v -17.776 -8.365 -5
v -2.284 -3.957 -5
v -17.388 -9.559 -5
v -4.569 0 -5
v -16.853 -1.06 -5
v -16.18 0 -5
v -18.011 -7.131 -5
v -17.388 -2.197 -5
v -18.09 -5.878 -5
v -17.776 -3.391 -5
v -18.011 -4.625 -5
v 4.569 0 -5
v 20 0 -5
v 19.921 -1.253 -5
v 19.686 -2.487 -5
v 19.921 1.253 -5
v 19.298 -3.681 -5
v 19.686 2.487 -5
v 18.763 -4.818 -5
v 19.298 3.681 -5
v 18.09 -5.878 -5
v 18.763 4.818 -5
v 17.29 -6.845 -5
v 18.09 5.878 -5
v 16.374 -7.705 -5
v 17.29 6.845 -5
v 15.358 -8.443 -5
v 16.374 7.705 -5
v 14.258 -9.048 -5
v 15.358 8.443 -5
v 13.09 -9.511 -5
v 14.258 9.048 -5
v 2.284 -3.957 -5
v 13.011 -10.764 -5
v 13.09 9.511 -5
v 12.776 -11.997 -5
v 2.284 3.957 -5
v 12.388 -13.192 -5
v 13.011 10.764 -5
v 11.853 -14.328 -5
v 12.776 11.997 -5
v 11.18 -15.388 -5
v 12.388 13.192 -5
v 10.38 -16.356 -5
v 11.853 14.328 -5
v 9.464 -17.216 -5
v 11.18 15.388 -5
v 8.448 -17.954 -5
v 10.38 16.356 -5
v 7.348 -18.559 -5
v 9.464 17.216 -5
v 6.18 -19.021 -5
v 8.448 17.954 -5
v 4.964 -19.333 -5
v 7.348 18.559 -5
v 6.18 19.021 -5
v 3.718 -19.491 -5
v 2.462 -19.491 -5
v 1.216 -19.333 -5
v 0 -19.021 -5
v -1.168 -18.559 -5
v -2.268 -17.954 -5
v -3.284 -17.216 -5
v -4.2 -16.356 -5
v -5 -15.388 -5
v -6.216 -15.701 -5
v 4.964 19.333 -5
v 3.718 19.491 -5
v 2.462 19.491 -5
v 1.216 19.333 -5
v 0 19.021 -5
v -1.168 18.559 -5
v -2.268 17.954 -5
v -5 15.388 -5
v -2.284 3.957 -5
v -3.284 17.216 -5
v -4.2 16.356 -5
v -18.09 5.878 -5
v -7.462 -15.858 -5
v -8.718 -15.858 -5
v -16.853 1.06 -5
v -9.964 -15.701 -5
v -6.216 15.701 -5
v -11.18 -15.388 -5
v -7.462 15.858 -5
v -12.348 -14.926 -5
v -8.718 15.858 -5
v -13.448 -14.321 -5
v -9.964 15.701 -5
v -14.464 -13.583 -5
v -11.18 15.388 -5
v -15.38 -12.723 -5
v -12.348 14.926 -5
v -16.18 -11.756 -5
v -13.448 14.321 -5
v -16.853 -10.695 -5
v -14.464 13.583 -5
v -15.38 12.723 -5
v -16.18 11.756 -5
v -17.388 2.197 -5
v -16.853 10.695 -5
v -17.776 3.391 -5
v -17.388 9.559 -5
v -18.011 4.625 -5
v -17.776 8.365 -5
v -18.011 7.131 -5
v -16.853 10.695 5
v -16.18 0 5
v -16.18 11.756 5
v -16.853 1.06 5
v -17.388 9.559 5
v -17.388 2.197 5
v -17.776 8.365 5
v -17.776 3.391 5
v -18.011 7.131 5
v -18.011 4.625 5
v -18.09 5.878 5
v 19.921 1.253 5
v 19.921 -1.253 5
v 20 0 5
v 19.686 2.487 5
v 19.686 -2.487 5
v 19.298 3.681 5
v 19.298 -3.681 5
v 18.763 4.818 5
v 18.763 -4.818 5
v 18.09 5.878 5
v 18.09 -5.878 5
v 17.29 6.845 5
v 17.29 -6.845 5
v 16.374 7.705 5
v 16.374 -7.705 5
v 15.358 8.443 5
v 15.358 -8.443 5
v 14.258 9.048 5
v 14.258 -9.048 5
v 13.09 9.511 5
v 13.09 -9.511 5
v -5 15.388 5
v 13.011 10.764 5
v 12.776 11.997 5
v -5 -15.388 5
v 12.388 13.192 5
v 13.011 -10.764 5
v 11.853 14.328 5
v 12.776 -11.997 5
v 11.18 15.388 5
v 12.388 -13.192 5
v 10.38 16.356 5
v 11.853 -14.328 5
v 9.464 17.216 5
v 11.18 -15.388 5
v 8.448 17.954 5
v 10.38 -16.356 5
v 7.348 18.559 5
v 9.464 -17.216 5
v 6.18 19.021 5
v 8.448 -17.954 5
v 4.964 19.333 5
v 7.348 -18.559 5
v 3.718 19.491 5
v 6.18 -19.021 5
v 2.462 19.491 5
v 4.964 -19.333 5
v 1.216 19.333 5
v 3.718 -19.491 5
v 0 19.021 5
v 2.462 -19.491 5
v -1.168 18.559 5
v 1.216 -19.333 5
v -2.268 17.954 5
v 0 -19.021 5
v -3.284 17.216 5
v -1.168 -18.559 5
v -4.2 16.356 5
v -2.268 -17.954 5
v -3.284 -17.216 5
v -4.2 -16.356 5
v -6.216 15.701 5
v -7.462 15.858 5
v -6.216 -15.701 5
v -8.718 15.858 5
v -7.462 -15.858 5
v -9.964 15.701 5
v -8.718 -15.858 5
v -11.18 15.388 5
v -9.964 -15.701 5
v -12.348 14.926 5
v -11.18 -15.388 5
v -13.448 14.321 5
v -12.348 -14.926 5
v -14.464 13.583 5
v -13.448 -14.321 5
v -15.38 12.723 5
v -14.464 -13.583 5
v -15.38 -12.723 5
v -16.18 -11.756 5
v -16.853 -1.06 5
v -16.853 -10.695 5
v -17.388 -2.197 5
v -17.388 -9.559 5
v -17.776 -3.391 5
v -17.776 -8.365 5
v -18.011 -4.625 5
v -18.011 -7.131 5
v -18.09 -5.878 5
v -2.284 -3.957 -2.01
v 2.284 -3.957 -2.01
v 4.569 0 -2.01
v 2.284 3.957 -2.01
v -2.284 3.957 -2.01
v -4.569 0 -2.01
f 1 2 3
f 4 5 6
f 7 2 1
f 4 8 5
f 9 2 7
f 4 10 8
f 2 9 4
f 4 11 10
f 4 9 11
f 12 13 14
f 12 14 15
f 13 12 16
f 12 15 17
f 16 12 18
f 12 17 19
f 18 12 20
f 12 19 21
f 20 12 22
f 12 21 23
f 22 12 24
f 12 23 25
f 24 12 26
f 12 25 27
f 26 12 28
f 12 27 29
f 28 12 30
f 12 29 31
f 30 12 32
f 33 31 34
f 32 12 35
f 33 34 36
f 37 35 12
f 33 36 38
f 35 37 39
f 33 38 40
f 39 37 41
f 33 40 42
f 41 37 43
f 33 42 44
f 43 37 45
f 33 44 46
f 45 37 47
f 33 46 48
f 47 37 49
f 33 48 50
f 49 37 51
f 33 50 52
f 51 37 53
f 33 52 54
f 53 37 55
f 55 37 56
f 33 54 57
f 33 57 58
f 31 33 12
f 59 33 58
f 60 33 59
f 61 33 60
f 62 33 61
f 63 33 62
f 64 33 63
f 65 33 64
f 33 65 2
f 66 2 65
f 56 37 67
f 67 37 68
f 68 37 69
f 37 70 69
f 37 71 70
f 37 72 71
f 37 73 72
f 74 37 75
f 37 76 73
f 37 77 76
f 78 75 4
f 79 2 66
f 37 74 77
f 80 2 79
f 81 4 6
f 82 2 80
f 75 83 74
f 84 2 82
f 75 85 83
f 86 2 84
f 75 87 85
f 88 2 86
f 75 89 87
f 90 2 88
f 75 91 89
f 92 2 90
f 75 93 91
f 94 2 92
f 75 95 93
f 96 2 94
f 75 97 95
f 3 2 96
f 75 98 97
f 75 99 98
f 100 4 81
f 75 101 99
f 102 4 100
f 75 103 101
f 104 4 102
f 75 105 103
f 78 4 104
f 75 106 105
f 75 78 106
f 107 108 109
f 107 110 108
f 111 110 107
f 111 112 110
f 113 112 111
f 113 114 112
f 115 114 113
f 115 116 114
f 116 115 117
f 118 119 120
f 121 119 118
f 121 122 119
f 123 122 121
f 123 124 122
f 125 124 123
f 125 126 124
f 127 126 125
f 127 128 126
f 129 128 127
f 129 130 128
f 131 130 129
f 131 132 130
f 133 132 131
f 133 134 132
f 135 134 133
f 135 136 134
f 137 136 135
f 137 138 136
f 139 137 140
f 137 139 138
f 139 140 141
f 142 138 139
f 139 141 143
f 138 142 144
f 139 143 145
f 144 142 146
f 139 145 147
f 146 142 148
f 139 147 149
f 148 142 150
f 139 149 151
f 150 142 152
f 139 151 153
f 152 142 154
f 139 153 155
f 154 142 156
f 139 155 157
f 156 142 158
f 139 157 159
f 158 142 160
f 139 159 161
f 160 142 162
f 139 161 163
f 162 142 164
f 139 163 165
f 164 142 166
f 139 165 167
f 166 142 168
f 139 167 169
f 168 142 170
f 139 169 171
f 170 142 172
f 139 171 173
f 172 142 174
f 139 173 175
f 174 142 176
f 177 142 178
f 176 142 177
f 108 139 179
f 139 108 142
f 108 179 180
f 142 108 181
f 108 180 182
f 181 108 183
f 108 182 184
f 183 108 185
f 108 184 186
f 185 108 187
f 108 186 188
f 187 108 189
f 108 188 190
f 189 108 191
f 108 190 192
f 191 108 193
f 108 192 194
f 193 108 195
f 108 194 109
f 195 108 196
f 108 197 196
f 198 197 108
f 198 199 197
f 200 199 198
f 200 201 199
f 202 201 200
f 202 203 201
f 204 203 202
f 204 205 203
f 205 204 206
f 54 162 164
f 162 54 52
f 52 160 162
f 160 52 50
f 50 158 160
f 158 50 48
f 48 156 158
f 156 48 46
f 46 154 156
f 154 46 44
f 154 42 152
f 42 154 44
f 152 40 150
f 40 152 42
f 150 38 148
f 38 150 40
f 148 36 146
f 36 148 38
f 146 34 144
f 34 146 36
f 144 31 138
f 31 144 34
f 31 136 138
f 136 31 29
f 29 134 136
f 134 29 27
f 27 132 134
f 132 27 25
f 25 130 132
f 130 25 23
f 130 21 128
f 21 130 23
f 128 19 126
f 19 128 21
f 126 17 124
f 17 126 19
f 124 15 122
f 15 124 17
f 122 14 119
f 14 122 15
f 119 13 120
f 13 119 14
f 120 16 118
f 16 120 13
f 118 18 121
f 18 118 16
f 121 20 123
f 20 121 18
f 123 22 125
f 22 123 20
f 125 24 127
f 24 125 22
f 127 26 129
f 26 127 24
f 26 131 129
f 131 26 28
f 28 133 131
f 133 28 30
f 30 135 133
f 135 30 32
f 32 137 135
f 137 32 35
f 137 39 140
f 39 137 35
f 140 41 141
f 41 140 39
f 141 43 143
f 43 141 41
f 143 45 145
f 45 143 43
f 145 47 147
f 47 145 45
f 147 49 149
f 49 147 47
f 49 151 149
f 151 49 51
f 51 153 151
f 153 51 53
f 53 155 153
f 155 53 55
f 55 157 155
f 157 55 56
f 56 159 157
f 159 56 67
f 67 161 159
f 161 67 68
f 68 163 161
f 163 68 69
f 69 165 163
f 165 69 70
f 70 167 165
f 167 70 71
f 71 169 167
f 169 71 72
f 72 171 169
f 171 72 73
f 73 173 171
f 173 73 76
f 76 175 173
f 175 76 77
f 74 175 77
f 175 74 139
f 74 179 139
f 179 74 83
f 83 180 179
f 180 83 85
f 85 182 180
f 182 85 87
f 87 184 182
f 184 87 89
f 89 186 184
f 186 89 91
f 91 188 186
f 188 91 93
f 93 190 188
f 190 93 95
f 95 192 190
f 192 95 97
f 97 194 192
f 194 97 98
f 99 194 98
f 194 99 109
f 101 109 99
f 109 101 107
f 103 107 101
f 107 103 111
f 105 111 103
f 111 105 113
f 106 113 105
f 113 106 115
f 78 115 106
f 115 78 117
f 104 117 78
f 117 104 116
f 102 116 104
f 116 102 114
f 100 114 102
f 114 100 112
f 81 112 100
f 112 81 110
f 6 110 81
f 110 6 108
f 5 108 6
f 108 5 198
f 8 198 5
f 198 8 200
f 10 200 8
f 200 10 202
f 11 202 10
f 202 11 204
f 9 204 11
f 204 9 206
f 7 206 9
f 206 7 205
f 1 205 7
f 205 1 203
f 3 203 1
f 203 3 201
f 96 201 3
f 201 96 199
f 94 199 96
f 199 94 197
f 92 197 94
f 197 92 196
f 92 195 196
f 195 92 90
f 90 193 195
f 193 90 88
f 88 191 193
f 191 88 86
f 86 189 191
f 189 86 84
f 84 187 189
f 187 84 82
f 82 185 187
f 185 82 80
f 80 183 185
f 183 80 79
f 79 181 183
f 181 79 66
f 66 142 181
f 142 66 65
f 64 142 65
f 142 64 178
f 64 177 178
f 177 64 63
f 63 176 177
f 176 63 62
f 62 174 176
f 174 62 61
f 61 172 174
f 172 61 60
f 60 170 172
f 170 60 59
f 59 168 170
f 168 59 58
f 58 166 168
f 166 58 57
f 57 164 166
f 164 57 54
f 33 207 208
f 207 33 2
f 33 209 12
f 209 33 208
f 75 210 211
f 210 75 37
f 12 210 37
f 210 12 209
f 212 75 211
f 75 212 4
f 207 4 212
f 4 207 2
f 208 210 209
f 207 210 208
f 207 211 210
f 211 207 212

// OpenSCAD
$fn = 50;

module star_knob(radius, points, height, nut_width_across_flats, nut_depth, clearance) 
{
    assert(radius>0 && points>0 && height>0 && nut_width_across_flats>0 && nut_depth>0 && clearance>0, "negative input");
    assert(radius*2 > nut_width_across_flats,"nut must be smaller than overall radius");
    assert(nut_depth < height, "nut can't reach both ends"); // this one is critical depends on the application, might be removed if it is okay
    angel_inc = 360/points;
    // assert to max point number but timer out

    difference()
    {
        // The outer star body
        linear_extrude(height=height, center=true) {
            for(i=[0:points-1]) {
                rotate([0, 0, i * angel_inc])
                translate([radius/2, 0, 0])
                circle(r=radius/2);
            }
            circle(r=radius/2);
        }

        // The Hex Nut Trap (M5 nut = approx 8mm flat-to-flat)
        translate([0,0, -height/2-0.01]) {
            cylinder(r=(nut_width_across_flats / 2) / cos(30) - clearance, h=nut_depth, $fn=6); 
        }
    }
}
 
// example usage
star_knob(20, 5, 10, 8, 3, 0.05);
